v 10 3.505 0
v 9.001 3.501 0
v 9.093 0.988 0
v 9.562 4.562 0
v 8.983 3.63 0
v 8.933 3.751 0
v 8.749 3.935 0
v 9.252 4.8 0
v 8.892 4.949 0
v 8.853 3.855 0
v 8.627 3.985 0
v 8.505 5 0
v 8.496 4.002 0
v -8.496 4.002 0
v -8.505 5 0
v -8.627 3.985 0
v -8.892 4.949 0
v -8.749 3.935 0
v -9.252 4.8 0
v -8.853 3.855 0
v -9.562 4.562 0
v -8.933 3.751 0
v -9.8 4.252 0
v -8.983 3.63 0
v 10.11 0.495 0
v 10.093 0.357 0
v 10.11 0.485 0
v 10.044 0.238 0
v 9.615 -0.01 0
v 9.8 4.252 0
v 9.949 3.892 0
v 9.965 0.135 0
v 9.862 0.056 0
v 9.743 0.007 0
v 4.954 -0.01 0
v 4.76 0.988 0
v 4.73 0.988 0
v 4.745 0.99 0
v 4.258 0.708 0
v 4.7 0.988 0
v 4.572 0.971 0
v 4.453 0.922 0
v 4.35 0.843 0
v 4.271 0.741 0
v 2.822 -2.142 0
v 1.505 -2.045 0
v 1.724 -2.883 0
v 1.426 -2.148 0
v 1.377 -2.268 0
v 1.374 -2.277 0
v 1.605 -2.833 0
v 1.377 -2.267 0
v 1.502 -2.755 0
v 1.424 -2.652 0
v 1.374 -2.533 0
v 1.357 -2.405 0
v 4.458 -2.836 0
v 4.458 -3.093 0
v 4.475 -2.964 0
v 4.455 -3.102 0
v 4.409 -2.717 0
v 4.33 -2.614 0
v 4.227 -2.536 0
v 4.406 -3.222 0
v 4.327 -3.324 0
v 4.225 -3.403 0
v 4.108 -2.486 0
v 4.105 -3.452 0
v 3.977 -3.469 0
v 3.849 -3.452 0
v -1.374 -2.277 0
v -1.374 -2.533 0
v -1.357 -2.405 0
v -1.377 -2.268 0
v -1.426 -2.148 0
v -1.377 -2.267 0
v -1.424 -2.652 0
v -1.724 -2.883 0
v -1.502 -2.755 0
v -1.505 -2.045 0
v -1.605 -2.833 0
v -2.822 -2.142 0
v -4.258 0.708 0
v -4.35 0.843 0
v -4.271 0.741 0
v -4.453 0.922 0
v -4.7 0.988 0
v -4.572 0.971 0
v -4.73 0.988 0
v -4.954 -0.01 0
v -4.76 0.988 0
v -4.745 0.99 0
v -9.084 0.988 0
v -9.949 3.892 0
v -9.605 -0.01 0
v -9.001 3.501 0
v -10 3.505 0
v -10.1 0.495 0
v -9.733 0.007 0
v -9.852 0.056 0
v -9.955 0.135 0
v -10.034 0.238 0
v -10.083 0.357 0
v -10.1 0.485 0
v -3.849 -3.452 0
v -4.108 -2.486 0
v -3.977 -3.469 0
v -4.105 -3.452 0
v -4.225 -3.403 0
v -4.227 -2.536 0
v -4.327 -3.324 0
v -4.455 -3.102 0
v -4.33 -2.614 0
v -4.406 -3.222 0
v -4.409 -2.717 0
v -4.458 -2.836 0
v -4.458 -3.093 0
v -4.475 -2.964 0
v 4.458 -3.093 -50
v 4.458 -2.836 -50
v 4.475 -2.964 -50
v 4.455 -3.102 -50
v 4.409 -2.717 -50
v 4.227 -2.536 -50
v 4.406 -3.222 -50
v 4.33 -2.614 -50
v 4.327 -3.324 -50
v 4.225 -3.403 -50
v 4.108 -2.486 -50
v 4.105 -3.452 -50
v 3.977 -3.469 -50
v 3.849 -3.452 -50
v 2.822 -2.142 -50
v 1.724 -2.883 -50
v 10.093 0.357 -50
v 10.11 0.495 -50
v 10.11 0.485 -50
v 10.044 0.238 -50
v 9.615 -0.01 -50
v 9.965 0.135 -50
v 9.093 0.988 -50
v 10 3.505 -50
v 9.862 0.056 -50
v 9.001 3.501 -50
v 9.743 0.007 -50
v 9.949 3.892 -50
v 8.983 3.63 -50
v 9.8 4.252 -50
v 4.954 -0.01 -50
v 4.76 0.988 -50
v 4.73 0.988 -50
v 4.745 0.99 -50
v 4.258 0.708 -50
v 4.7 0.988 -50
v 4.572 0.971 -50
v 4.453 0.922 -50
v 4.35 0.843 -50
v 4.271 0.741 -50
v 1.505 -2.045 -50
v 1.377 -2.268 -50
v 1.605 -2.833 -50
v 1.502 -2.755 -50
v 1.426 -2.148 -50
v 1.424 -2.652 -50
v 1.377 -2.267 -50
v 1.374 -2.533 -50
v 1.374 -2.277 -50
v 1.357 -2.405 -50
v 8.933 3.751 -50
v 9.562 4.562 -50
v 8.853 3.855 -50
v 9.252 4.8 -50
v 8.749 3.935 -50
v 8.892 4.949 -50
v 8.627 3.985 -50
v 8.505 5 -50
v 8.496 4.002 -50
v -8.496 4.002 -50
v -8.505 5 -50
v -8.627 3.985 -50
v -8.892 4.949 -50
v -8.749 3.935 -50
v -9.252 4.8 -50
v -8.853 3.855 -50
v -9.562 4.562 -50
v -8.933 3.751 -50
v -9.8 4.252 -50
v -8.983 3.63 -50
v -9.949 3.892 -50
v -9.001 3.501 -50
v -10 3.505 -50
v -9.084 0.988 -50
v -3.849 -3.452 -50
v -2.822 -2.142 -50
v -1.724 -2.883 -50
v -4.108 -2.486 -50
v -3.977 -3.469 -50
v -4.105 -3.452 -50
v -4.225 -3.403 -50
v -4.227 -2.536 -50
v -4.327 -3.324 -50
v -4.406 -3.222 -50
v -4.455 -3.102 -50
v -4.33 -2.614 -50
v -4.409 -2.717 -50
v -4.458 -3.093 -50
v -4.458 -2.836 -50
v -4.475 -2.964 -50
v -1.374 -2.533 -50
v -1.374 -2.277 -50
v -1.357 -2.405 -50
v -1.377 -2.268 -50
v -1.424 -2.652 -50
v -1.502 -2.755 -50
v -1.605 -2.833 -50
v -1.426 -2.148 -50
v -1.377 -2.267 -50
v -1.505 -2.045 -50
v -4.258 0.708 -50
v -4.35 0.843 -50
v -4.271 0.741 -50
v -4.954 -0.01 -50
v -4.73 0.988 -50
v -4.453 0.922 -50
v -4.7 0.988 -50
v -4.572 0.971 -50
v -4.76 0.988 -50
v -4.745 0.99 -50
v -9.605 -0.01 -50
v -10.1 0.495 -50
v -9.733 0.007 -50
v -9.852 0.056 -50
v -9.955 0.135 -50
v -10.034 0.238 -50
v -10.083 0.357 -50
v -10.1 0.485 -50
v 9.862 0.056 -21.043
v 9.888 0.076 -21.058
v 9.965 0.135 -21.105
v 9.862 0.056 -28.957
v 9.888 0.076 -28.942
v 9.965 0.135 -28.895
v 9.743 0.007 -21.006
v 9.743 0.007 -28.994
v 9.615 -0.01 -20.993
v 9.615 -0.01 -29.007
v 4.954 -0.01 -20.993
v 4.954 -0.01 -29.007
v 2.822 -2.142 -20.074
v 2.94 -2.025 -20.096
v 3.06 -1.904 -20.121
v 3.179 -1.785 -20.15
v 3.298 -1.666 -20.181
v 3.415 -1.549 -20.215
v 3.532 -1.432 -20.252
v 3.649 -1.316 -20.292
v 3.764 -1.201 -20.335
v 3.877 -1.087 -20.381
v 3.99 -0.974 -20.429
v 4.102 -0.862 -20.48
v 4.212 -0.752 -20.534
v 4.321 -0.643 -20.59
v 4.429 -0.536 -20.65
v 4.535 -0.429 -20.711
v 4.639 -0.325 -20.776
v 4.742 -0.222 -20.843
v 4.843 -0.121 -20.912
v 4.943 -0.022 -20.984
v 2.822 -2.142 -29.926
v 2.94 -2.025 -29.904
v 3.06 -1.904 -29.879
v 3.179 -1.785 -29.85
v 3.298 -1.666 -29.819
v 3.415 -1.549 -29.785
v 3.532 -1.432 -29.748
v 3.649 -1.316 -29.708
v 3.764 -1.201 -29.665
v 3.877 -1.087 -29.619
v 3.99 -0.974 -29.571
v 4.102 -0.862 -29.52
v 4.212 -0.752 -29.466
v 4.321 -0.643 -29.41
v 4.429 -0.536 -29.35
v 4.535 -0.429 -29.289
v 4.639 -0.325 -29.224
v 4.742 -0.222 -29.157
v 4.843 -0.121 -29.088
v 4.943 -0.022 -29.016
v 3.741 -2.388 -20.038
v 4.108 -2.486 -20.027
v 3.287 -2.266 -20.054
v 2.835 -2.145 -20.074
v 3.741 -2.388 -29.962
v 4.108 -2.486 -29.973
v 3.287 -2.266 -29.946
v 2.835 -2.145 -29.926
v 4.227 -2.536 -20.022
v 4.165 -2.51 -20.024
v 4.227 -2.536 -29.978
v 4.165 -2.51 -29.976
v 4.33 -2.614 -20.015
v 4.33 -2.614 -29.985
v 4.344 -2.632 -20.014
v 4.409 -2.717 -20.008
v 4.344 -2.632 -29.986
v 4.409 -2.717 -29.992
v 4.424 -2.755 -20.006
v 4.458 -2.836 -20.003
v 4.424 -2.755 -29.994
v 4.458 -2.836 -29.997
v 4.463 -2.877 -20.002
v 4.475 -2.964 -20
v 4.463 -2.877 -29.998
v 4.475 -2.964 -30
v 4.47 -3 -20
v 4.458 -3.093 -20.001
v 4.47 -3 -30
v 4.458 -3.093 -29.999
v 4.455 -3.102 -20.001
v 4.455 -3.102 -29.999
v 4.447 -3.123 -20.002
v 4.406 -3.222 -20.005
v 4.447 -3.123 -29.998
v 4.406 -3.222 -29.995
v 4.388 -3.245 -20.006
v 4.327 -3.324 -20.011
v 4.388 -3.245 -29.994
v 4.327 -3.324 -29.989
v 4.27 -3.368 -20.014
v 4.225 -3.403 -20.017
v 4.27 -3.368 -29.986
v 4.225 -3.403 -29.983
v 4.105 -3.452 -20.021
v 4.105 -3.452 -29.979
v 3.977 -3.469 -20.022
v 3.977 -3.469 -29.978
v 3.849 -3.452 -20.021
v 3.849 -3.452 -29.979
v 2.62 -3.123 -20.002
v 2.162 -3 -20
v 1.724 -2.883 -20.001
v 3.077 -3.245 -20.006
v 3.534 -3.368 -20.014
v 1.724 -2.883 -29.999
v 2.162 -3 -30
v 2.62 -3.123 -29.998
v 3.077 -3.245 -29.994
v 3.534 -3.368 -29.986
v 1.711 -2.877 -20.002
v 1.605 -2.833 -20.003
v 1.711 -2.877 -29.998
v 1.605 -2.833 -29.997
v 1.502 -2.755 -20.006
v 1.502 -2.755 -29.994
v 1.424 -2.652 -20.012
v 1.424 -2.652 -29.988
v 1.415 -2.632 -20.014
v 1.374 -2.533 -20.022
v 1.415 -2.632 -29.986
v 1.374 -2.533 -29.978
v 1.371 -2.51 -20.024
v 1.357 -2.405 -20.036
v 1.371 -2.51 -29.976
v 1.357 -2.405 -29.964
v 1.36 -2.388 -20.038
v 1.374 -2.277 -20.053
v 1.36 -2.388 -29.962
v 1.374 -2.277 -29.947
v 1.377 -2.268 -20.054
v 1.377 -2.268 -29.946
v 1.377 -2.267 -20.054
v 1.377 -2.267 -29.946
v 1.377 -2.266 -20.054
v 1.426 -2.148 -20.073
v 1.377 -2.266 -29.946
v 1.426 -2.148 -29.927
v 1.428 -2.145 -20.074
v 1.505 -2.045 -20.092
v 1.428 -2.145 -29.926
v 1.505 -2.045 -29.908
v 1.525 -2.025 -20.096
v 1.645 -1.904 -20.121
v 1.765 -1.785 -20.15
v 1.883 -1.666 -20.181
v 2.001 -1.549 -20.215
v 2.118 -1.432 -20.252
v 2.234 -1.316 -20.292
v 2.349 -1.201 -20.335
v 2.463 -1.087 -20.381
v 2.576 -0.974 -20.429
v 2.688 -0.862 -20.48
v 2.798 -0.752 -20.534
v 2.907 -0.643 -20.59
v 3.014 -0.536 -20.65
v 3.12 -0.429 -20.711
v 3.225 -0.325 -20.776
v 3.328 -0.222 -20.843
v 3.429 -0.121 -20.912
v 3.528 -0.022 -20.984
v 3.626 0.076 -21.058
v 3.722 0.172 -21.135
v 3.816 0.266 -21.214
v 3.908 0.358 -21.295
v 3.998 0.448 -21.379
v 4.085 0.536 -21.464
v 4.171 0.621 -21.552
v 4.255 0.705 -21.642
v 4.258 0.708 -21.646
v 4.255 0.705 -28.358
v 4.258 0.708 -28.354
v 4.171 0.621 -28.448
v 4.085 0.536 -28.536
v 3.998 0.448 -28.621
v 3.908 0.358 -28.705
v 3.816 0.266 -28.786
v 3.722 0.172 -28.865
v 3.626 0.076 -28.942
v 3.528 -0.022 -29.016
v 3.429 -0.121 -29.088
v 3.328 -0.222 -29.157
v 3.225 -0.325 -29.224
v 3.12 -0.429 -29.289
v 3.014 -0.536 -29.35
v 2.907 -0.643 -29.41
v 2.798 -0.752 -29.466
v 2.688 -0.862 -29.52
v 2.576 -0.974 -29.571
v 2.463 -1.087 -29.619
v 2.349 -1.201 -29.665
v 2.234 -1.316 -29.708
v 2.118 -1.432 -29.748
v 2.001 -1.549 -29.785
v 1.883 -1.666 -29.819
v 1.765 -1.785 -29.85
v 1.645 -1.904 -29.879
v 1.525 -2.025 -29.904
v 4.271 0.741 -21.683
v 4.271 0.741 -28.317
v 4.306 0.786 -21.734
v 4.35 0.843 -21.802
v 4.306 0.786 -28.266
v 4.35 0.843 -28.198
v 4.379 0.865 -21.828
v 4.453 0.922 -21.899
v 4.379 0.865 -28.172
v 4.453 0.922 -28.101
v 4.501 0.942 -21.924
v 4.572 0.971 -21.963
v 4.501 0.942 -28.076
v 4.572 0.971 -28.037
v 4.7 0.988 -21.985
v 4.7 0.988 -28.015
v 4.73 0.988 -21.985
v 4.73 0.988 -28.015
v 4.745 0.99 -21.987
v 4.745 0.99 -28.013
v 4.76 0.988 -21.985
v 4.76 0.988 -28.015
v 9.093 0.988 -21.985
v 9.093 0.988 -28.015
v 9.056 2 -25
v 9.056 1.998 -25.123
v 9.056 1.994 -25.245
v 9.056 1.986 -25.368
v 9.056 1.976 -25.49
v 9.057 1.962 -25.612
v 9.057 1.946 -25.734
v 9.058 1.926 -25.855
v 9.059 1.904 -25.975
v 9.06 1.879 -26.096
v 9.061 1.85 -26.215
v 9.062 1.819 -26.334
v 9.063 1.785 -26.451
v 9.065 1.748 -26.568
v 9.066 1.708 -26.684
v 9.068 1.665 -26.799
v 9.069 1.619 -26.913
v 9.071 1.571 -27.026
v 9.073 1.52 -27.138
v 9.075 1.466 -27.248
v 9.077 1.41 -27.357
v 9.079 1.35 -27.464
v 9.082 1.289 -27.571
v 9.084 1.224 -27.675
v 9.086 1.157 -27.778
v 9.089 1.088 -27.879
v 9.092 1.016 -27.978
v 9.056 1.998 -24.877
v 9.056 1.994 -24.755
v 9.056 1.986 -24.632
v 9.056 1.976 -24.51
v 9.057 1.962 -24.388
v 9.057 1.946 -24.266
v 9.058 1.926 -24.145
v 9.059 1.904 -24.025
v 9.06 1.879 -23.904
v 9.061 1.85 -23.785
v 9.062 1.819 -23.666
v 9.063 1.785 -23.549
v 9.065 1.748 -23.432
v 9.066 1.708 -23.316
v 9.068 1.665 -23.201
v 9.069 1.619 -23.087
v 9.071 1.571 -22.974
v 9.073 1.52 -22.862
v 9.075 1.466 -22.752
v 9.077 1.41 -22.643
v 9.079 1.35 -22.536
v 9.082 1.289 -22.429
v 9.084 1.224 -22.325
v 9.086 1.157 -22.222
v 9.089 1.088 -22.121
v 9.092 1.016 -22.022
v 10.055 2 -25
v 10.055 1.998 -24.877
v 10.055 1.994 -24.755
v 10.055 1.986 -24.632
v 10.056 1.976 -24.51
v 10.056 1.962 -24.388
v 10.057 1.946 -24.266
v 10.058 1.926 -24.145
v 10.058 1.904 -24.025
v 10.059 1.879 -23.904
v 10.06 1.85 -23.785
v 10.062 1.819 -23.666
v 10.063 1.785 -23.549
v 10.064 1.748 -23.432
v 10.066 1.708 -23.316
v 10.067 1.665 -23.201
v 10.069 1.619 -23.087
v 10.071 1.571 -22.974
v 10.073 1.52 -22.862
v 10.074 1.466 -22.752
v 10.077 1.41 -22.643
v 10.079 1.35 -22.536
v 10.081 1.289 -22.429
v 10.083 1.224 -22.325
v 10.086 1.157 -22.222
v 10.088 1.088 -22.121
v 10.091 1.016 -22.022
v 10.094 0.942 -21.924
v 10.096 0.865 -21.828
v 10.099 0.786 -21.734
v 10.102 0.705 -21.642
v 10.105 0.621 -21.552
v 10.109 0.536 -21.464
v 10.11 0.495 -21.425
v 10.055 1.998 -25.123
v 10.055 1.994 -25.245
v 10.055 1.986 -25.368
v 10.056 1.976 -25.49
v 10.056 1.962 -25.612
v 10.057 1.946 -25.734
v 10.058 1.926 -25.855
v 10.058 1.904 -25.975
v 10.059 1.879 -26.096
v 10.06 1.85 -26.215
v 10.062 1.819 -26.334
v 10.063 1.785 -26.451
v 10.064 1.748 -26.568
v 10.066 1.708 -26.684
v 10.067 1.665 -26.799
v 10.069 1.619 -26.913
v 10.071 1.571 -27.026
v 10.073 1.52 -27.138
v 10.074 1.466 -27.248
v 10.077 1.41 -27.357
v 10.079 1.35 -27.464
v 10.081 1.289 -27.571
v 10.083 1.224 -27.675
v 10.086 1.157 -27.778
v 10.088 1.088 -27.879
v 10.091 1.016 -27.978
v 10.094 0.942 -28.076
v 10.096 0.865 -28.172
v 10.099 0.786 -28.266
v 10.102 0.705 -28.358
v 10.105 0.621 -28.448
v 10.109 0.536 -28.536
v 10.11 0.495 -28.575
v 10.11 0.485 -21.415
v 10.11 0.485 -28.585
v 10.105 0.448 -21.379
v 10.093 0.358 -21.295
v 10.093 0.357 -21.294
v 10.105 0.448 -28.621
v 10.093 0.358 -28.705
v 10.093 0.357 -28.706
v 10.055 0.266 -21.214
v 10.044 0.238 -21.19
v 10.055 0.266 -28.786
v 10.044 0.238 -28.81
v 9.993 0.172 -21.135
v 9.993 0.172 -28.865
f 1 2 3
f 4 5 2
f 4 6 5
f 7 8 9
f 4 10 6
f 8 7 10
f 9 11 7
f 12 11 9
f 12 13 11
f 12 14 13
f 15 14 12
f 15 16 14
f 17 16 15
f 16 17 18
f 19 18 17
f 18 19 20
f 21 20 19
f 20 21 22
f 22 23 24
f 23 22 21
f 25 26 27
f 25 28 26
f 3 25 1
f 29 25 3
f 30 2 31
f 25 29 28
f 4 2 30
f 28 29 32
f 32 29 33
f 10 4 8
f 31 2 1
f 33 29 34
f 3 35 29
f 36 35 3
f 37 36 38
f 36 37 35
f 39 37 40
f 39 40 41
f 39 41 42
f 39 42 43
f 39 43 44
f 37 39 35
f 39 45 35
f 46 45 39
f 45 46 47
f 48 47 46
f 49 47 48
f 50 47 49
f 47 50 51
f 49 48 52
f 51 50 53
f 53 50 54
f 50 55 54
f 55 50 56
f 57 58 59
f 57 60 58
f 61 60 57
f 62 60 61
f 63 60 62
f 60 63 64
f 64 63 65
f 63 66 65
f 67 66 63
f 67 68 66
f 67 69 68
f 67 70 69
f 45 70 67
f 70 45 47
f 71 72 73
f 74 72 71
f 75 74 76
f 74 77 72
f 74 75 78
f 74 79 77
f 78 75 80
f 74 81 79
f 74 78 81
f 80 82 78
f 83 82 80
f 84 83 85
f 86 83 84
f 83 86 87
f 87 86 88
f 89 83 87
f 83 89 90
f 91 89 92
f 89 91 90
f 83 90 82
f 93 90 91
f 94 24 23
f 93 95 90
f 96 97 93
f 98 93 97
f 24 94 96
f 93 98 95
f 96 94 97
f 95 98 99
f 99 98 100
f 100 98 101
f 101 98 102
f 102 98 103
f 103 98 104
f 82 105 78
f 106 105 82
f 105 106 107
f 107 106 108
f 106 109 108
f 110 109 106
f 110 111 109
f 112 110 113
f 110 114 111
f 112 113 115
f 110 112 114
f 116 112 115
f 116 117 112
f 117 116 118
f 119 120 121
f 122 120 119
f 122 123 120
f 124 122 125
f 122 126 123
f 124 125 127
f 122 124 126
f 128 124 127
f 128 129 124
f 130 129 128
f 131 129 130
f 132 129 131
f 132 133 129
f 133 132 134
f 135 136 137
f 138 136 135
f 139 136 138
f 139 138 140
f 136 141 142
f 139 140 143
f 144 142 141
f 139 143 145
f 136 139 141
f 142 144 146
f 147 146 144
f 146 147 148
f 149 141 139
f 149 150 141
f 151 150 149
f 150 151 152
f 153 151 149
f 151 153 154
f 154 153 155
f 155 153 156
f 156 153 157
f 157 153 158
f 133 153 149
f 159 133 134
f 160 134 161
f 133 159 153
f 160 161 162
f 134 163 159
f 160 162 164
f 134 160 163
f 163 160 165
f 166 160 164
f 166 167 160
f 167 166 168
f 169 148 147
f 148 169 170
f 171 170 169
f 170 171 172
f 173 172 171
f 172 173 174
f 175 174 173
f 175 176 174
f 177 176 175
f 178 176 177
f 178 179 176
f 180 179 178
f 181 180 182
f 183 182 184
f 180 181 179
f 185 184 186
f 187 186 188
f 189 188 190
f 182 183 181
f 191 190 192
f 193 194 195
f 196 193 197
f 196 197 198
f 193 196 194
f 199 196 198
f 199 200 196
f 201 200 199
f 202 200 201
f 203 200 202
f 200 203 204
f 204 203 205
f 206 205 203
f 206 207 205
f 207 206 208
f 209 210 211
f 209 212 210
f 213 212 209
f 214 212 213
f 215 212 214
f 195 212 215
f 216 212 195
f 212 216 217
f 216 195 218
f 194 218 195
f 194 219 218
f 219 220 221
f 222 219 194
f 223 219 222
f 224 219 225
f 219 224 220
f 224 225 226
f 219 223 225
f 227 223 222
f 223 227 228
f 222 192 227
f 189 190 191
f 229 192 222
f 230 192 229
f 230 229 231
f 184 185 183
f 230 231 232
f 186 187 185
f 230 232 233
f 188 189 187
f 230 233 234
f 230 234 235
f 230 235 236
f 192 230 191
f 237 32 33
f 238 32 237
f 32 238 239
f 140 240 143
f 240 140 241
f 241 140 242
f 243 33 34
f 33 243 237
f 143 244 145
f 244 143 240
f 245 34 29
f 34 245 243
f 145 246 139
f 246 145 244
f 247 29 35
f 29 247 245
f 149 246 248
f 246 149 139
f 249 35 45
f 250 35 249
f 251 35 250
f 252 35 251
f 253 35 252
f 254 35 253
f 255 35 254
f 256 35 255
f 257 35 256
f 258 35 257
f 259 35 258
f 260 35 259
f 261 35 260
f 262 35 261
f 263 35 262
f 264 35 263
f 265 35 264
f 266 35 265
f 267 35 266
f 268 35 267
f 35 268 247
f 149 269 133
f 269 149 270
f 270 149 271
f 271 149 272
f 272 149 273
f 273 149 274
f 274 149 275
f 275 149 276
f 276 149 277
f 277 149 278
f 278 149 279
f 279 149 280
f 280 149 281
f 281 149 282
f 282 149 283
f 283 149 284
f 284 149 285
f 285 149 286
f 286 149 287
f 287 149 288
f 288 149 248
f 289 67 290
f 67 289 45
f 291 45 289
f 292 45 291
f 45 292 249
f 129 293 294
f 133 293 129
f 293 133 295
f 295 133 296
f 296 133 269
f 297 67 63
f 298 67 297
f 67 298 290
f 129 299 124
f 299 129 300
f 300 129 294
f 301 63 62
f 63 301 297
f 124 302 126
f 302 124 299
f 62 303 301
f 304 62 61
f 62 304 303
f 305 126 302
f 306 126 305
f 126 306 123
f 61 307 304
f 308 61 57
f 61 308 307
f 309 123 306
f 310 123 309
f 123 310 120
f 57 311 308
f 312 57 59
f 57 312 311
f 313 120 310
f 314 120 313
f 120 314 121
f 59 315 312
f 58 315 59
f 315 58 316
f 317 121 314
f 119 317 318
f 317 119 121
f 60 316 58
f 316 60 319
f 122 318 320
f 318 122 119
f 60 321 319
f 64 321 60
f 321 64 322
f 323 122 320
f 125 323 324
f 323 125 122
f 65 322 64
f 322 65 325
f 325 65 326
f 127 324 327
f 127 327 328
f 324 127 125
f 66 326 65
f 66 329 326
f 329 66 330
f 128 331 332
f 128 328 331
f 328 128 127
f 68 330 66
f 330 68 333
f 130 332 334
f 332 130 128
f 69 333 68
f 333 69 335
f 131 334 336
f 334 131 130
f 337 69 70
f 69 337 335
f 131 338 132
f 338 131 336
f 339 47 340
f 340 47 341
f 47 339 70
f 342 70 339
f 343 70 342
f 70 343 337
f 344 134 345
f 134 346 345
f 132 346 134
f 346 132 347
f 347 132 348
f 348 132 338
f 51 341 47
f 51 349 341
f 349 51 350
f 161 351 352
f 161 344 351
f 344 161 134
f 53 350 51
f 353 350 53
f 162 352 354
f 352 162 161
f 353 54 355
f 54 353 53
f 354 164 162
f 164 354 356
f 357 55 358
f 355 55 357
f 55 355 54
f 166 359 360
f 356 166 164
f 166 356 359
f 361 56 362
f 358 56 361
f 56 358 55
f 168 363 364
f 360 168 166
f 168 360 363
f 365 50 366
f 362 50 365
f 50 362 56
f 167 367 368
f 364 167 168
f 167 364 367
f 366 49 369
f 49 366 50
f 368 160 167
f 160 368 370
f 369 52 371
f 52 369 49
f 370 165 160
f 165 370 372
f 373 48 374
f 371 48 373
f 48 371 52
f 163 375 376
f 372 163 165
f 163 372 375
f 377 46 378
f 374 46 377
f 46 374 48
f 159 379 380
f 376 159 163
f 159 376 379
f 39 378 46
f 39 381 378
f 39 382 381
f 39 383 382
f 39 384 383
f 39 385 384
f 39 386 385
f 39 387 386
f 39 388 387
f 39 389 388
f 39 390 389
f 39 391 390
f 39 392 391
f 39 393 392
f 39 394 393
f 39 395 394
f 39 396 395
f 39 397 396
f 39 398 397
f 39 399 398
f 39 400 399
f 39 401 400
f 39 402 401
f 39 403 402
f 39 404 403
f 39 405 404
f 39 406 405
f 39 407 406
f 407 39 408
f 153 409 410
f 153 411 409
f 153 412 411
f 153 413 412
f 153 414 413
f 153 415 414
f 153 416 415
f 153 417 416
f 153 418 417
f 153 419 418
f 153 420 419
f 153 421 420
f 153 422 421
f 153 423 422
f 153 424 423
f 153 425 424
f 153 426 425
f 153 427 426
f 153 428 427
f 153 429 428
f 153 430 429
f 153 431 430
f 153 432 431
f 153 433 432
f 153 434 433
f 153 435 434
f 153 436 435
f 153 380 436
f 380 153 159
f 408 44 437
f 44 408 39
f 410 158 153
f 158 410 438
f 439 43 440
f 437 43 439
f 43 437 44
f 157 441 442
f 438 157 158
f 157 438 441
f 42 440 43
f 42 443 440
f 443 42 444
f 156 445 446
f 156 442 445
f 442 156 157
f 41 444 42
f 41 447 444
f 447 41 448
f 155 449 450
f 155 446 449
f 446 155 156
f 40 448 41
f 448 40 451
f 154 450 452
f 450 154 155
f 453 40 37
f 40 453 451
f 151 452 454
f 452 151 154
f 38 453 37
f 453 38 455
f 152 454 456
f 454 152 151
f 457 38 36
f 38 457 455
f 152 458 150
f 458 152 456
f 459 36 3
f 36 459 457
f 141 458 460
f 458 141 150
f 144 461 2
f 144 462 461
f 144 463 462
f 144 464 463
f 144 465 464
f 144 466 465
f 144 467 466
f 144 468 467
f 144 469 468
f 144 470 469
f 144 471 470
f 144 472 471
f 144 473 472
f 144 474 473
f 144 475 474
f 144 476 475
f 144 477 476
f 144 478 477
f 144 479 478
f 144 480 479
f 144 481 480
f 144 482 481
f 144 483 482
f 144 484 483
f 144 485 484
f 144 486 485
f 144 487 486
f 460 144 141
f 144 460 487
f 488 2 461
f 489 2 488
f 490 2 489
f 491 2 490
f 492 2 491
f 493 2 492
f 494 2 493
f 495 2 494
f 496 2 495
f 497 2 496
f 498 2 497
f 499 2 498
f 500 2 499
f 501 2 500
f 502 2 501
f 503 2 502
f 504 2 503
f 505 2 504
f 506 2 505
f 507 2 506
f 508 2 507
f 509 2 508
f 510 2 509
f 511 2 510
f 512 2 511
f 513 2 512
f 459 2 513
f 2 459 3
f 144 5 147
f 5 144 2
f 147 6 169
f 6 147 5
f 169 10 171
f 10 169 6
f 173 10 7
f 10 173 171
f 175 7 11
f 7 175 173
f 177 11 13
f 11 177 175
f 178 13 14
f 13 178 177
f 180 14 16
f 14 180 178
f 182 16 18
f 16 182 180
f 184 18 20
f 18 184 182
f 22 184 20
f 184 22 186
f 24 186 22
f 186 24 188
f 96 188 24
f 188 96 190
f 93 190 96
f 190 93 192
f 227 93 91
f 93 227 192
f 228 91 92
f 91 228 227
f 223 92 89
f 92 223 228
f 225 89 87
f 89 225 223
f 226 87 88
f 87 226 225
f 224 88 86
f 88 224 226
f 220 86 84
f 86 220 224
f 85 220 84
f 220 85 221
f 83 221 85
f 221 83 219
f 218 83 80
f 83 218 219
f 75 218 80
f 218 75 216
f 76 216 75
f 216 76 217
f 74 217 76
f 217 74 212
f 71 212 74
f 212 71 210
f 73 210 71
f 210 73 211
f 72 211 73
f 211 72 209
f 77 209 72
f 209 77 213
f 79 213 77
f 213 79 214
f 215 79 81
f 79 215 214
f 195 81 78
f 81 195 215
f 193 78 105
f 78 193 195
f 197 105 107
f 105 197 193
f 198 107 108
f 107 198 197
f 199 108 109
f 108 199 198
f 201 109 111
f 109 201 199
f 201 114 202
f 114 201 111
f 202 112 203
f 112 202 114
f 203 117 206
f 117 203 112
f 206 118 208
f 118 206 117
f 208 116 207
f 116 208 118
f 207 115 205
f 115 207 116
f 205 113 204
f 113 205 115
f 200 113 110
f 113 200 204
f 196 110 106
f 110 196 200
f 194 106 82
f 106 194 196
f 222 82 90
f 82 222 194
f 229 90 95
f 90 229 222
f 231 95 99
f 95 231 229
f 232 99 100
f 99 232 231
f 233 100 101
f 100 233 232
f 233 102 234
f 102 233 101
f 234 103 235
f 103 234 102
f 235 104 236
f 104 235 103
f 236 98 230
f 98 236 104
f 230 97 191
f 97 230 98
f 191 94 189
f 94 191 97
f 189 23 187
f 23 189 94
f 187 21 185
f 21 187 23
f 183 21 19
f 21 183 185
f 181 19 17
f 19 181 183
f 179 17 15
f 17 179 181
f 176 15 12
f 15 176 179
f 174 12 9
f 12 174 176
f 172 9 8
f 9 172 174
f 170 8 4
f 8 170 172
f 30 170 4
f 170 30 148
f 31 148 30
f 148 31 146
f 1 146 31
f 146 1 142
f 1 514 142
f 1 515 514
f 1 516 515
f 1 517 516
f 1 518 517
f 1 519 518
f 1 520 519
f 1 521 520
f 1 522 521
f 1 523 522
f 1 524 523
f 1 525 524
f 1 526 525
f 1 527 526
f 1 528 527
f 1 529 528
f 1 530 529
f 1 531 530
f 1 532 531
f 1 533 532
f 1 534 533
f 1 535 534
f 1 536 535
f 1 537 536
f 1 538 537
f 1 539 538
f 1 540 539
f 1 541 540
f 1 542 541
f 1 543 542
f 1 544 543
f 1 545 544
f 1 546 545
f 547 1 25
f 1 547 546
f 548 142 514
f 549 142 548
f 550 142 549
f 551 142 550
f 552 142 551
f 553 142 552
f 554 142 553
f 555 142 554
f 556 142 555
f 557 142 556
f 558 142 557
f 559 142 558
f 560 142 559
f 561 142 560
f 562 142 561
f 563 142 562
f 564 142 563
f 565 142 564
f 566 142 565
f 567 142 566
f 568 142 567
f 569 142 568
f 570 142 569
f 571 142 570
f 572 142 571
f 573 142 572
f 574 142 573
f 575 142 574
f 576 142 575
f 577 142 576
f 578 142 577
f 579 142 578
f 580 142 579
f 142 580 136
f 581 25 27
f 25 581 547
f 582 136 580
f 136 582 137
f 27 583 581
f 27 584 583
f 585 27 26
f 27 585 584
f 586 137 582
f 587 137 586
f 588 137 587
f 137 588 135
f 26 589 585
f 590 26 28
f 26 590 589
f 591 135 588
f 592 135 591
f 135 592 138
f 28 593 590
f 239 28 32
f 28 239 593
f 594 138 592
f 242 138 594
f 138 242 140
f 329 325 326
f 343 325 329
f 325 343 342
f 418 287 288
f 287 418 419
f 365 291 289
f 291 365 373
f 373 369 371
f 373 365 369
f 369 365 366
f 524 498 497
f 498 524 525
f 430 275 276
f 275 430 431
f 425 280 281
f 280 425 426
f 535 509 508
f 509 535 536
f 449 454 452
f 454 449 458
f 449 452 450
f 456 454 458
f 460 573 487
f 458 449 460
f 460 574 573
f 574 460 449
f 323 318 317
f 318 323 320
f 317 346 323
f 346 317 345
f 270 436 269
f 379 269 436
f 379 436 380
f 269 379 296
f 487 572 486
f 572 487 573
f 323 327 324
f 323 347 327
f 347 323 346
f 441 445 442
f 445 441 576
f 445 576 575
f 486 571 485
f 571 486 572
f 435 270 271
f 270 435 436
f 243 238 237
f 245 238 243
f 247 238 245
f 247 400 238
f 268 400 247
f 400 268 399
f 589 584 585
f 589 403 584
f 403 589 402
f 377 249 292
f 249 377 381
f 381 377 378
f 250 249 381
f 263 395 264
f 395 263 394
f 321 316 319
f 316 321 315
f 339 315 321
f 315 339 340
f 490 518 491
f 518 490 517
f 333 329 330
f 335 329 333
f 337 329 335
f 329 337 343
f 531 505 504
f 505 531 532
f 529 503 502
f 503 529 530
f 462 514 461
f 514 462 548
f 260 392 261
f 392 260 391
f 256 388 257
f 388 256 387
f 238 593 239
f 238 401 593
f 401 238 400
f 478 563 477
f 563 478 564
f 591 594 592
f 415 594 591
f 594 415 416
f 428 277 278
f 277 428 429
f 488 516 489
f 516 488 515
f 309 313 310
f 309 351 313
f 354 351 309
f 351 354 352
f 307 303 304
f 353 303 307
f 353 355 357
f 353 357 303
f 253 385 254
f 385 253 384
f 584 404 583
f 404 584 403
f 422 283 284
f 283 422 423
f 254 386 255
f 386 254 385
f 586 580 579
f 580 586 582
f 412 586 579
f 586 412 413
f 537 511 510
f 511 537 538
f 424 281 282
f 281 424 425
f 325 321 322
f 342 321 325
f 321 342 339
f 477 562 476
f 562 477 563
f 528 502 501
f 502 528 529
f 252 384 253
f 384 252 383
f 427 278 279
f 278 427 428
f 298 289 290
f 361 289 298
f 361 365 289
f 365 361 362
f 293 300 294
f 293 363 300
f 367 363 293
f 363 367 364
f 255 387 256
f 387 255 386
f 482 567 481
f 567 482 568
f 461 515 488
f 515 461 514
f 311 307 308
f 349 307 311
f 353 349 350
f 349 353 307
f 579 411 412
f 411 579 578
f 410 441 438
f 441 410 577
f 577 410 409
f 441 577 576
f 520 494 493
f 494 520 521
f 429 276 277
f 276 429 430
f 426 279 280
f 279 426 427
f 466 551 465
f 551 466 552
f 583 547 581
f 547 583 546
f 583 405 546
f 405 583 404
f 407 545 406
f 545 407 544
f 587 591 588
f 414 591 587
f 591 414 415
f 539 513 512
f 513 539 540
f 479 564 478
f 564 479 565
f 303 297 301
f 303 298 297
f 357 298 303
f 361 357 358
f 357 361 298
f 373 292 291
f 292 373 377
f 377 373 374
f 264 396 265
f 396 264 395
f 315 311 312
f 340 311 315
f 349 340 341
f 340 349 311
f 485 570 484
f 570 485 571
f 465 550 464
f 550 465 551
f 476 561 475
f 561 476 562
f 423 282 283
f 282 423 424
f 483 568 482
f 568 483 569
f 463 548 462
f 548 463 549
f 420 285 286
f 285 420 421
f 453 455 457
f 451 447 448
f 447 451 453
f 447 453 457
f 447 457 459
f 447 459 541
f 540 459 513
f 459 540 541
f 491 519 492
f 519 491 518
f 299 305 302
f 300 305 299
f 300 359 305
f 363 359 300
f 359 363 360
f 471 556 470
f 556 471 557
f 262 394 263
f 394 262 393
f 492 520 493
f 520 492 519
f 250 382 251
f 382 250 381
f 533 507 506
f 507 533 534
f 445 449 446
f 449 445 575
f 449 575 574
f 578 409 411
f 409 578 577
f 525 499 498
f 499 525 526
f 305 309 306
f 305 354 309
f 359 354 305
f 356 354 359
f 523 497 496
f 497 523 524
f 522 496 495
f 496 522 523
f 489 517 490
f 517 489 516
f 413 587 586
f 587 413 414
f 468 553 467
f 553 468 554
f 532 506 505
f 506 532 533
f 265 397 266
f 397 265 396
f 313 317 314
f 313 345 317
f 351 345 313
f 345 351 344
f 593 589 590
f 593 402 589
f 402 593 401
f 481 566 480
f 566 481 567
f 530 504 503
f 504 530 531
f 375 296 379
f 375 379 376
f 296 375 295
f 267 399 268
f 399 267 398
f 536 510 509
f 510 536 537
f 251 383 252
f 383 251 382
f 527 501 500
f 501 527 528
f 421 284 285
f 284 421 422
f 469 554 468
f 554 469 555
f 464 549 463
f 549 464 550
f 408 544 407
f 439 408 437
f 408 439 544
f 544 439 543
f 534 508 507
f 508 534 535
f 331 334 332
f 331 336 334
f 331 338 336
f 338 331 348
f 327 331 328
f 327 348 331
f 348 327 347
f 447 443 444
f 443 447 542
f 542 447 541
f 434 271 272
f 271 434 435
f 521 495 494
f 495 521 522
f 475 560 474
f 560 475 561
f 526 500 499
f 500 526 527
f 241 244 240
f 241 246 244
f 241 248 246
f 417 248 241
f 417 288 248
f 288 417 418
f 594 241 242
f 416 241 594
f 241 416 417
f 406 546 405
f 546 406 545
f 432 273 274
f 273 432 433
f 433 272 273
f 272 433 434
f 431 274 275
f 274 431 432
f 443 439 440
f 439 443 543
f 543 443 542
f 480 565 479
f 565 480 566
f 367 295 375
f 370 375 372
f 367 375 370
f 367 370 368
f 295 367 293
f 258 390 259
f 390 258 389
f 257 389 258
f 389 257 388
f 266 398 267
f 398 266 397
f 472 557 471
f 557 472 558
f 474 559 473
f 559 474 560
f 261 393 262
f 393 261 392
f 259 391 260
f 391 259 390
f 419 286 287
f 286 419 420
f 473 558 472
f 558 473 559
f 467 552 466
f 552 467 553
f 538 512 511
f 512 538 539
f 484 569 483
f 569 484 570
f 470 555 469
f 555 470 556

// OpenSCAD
l=50;  // Length of channel
d=5;  // Depth (outside), 3 mm min
cR=1;  // Radius for Rounding of corners
slop=0.1;  // Not too tight
w=0.01;  // Line width for initial drawing. We then widen it to 2 times nozzle diameter
nz=0.5 - w/2; // Nozzle diameter for vase mode
tT=1.8+slop; // Tslot thickness of lip
lC=2.2; // Length of retainer
t=0.1;  // Extra width for tension
tG=6-slop+2*t; // Tslot gap
endL=10+1;
endH=d+1;
$fn=256;
rotate([180,0,0])
render(convexity = 6)
difference() {
linear_extrude(height=l) cablehouse();
rotate([0,90,0])
translate([-l/2,endH/2,-endL/2+tG])
cylinder(h = 2*endL, r = d,center = true/false);    
    
}
module cablehouse()
{
    minkowski()
    {
        union()
        {
            channelb();
            clip();
            mirror([1,0,0]) clip();
        }
        circle(r=nz,$fn=24);
    }
}

module channelb()
{
    translate([0,-d/2]) difference()
    {
        channela();
        scale([1-2*w/20,1-2*w/d]) channela();
        translate([0,d/2]) square([tG+tT+2*nz*1.41428,4*nz],center=true);
    }
}

module channela()
{
    translate([0,d/2]) hull()
    {
        translate([10-nz+t,-nz]) square([w,w]);
        translate([-(10-nz+t),-nz]) square([w,w]);
        translate([-(10-nz-cR),-d+nz+cR]) circle(r=cR,$fn=24);
        translate([(10-nz-cR),-d+nz+cR]) circle(r=cR,$fn=24);
    }
}

module clip()
{
    l1 = (tT+2*nz)*1.41428;
    translate([tG/2+tT-nz*1.41428,0]) rotate([0,0,45]) translate([0,-nz*1.41428]) square([w,l1]);
    translate([tG/2-2.41428*nz,(tT+nz)]) rotate([0,0,15])square([lC,w]);
}
